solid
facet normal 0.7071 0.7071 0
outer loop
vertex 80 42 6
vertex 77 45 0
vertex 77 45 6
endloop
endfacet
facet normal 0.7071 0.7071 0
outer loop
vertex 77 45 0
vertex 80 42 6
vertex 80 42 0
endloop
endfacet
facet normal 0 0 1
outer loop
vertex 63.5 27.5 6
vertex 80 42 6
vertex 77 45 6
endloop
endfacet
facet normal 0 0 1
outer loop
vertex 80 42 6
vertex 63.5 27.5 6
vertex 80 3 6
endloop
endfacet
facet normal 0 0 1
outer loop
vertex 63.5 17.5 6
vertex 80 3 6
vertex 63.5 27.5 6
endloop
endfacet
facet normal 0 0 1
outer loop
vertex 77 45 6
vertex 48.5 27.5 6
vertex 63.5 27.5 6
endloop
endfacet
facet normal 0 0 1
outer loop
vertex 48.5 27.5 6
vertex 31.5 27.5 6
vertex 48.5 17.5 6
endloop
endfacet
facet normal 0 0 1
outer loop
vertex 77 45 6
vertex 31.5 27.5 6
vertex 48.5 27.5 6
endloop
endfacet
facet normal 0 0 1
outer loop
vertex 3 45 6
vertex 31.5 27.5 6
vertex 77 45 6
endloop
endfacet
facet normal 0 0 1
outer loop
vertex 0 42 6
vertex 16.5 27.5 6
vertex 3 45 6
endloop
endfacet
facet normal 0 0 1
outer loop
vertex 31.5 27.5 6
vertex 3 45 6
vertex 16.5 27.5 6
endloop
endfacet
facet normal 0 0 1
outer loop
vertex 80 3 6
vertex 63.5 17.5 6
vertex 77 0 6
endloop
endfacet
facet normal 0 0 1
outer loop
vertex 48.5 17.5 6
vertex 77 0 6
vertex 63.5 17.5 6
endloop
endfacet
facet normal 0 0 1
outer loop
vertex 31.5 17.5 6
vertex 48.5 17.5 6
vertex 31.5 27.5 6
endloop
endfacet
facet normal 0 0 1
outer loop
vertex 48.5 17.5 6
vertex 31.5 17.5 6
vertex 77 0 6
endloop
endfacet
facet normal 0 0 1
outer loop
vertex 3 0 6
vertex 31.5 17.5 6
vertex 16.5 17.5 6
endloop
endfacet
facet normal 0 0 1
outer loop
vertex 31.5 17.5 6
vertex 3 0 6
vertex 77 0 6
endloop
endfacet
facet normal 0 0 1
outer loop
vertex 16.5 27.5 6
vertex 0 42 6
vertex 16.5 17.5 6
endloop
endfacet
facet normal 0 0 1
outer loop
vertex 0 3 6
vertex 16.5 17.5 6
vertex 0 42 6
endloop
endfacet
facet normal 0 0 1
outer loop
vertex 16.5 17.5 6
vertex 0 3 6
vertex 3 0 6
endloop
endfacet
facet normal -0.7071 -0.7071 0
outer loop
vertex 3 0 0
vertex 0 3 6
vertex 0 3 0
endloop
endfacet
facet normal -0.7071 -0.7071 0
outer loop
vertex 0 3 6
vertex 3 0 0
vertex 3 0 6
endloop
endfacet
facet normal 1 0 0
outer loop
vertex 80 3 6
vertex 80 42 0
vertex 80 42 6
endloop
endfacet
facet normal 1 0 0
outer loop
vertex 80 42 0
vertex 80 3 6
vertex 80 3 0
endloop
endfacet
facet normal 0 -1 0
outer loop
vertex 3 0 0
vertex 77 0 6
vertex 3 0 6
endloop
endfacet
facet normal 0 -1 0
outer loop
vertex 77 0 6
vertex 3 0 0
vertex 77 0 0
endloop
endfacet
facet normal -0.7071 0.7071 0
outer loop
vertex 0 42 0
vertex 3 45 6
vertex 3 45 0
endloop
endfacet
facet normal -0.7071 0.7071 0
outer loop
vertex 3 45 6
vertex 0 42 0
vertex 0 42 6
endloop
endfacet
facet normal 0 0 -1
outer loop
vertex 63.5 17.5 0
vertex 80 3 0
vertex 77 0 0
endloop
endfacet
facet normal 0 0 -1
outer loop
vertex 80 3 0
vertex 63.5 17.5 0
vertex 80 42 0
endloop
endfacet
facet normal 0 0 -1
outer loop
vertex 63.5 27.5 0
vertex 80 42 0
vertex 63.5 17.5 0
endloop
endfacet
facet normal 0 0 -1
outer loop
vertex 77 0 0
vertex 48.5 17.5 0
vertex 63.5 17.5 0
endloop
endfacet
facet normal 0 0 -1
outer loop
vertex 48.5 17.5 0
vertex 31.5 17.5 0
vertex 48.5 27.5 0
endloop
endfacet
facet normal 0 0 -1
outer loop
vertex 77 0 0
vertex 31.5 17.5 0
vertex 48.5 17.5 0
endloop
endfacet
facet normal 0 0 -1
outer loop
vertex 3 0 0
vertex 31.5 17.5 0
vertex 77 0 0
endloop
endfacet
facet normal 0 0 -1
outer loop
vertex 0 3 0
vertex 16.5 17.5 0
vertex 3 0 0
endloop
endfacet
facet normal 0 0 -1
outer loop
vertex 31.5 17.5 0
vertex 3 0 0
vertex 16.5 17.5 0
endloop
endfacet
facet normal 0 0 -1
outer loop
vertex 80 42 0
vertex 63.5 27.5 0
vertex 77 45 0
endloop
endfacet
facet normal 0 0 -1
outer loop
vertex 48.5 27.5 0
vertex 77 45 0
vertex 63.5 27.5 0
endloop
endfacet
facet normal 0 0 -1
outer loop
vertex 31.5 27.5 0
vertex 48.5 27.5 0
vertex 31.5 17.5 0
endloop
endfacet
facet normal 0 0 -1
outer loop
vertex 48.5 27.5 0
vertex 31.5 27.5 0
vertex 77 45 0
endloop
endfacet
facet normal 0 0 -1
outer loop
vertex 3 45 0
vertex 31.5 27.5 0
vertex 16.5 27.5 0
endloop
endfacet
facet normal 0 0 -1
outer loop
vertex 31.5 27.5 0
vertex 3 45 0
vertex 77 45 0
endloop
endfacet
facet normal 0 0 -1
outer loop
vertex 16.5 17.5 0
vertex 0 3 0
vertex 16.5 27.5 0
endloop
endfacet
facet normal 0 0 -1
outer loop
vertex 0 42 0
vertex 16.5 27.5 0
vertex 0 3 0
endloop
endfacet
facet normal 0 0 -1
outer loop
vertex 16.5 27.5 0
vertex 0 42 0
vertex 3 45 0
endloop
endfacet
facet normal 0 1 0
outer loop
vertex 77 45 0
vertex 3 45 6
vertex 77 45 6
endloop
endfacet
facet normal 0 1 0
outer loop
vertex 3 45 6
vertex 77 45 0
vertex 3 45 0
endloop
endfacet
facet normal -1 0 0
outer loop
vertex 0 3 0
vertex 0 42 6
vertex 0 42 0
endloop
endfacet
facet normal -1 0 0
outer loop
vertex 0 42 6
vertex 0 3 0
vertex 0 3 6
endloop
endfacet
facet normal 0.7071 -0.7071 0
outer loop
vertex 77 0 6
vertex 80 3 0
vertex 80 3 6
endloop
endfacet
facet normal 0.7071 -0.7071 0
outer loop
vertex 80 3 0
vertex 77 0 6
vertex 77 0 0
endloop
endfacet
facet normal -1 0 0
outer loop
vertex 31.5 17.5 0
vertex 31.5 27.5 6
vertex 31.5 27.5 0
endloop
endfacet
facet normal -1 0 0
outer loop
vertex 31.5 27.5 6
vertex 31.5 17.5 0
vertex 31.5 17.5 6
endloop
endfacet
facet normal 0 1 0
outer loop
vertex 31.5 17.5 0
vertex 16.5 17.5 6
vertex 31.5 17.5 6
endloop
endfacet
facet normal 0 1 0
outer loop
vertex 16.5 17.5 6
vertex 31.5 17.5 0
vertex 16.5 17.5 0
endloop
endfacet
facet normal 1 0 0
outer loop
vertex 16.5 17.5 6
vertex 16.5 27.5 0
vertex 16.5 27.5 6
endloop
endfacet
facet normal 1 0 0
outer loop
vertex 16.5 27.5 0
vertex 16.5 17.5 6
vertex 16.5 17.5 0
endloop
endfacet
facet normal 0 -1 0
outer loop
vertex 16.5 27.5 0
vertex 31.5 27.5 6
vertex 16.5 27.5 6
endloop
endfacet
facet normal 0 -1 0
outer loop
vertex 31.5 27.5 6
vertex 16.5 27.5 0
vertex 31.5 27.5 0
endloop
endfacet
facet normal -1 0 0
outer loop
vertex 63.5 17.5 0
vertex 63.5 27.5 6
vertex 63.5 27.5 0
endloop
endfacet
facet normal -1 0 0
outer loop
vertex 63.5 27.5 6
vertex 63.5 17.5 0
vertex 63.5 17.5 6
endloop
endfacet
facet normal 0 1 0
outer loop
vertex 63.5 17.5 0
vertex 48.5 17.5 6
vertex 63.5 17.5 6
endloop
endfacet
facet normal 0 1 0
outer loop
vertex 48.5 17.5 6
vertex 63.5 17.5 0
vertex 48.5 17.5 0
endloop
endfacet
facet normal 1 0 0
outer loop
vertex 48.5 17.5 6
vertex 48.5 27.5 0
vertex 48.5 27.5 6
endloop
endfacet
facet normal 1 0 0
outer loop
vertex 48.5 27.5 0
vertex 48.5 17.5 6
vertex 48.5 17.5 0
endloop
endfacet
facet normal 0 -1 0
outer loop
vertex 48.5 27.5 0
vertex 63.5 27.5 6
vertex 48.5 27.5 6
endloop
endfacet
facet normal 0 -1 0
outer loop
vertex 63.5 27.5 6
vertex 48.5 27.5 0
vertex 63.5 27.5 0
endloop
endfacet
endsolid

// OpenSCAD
$fn = 32;

// ----------------------------------------------------------------------
// Windowed plate: 2 voids, 80 x 45 x 6 mm
// ----------------------------------------------------------------------

// --- parameters (mm) ---
plate_l = 80;             // plate length, X
plate_w = 45;             // plate width, Y
plate_t = 6;              // plate thickness, Z
edge_margin = 8;          // wall from the plate edge to any window
windows = 2;              // number of windows in the row
win_l = 15;               // window length
win_w = 10;               // window width
win_pitch = 32;           // window pitch along X
depth_1 = 6;              // depth of void 1 (full thickness = through)
depth_2 = 6;              // depth of void 2 (full thickness = through)
corner_c = 3;             // corner chamfer of the plate

profile = [[3, 0], [77, 0], [80, 3], [80, 42], [77, 45], [3, 45], [0, 42], [0, 3]];  // primary outline, 8 points, counter clockwise
void_1 = [[16.5, 17.5], [31.5, 17.5], [31.5, 27.5], [16.5, 27.5]];  // window 1 of the row, 4 points
void_2 = [[48.5, 17.5], [63.5, 17.5], [63.5, 27.5], [48.5, 27.5]];  // window 2 of the row, 4 points

// --- the one profile operation ---
difference() {
  linear_extrude(height = plate_t) polygon(points = profile);
  translate([0, 0, -1])
    linear_extrude(height = plate_t + 2) polygon(points = void_1);
  translate([0, 0, -1])
    linear_extrude(height = plate_t + 2) polygon(points = void_2);
}
